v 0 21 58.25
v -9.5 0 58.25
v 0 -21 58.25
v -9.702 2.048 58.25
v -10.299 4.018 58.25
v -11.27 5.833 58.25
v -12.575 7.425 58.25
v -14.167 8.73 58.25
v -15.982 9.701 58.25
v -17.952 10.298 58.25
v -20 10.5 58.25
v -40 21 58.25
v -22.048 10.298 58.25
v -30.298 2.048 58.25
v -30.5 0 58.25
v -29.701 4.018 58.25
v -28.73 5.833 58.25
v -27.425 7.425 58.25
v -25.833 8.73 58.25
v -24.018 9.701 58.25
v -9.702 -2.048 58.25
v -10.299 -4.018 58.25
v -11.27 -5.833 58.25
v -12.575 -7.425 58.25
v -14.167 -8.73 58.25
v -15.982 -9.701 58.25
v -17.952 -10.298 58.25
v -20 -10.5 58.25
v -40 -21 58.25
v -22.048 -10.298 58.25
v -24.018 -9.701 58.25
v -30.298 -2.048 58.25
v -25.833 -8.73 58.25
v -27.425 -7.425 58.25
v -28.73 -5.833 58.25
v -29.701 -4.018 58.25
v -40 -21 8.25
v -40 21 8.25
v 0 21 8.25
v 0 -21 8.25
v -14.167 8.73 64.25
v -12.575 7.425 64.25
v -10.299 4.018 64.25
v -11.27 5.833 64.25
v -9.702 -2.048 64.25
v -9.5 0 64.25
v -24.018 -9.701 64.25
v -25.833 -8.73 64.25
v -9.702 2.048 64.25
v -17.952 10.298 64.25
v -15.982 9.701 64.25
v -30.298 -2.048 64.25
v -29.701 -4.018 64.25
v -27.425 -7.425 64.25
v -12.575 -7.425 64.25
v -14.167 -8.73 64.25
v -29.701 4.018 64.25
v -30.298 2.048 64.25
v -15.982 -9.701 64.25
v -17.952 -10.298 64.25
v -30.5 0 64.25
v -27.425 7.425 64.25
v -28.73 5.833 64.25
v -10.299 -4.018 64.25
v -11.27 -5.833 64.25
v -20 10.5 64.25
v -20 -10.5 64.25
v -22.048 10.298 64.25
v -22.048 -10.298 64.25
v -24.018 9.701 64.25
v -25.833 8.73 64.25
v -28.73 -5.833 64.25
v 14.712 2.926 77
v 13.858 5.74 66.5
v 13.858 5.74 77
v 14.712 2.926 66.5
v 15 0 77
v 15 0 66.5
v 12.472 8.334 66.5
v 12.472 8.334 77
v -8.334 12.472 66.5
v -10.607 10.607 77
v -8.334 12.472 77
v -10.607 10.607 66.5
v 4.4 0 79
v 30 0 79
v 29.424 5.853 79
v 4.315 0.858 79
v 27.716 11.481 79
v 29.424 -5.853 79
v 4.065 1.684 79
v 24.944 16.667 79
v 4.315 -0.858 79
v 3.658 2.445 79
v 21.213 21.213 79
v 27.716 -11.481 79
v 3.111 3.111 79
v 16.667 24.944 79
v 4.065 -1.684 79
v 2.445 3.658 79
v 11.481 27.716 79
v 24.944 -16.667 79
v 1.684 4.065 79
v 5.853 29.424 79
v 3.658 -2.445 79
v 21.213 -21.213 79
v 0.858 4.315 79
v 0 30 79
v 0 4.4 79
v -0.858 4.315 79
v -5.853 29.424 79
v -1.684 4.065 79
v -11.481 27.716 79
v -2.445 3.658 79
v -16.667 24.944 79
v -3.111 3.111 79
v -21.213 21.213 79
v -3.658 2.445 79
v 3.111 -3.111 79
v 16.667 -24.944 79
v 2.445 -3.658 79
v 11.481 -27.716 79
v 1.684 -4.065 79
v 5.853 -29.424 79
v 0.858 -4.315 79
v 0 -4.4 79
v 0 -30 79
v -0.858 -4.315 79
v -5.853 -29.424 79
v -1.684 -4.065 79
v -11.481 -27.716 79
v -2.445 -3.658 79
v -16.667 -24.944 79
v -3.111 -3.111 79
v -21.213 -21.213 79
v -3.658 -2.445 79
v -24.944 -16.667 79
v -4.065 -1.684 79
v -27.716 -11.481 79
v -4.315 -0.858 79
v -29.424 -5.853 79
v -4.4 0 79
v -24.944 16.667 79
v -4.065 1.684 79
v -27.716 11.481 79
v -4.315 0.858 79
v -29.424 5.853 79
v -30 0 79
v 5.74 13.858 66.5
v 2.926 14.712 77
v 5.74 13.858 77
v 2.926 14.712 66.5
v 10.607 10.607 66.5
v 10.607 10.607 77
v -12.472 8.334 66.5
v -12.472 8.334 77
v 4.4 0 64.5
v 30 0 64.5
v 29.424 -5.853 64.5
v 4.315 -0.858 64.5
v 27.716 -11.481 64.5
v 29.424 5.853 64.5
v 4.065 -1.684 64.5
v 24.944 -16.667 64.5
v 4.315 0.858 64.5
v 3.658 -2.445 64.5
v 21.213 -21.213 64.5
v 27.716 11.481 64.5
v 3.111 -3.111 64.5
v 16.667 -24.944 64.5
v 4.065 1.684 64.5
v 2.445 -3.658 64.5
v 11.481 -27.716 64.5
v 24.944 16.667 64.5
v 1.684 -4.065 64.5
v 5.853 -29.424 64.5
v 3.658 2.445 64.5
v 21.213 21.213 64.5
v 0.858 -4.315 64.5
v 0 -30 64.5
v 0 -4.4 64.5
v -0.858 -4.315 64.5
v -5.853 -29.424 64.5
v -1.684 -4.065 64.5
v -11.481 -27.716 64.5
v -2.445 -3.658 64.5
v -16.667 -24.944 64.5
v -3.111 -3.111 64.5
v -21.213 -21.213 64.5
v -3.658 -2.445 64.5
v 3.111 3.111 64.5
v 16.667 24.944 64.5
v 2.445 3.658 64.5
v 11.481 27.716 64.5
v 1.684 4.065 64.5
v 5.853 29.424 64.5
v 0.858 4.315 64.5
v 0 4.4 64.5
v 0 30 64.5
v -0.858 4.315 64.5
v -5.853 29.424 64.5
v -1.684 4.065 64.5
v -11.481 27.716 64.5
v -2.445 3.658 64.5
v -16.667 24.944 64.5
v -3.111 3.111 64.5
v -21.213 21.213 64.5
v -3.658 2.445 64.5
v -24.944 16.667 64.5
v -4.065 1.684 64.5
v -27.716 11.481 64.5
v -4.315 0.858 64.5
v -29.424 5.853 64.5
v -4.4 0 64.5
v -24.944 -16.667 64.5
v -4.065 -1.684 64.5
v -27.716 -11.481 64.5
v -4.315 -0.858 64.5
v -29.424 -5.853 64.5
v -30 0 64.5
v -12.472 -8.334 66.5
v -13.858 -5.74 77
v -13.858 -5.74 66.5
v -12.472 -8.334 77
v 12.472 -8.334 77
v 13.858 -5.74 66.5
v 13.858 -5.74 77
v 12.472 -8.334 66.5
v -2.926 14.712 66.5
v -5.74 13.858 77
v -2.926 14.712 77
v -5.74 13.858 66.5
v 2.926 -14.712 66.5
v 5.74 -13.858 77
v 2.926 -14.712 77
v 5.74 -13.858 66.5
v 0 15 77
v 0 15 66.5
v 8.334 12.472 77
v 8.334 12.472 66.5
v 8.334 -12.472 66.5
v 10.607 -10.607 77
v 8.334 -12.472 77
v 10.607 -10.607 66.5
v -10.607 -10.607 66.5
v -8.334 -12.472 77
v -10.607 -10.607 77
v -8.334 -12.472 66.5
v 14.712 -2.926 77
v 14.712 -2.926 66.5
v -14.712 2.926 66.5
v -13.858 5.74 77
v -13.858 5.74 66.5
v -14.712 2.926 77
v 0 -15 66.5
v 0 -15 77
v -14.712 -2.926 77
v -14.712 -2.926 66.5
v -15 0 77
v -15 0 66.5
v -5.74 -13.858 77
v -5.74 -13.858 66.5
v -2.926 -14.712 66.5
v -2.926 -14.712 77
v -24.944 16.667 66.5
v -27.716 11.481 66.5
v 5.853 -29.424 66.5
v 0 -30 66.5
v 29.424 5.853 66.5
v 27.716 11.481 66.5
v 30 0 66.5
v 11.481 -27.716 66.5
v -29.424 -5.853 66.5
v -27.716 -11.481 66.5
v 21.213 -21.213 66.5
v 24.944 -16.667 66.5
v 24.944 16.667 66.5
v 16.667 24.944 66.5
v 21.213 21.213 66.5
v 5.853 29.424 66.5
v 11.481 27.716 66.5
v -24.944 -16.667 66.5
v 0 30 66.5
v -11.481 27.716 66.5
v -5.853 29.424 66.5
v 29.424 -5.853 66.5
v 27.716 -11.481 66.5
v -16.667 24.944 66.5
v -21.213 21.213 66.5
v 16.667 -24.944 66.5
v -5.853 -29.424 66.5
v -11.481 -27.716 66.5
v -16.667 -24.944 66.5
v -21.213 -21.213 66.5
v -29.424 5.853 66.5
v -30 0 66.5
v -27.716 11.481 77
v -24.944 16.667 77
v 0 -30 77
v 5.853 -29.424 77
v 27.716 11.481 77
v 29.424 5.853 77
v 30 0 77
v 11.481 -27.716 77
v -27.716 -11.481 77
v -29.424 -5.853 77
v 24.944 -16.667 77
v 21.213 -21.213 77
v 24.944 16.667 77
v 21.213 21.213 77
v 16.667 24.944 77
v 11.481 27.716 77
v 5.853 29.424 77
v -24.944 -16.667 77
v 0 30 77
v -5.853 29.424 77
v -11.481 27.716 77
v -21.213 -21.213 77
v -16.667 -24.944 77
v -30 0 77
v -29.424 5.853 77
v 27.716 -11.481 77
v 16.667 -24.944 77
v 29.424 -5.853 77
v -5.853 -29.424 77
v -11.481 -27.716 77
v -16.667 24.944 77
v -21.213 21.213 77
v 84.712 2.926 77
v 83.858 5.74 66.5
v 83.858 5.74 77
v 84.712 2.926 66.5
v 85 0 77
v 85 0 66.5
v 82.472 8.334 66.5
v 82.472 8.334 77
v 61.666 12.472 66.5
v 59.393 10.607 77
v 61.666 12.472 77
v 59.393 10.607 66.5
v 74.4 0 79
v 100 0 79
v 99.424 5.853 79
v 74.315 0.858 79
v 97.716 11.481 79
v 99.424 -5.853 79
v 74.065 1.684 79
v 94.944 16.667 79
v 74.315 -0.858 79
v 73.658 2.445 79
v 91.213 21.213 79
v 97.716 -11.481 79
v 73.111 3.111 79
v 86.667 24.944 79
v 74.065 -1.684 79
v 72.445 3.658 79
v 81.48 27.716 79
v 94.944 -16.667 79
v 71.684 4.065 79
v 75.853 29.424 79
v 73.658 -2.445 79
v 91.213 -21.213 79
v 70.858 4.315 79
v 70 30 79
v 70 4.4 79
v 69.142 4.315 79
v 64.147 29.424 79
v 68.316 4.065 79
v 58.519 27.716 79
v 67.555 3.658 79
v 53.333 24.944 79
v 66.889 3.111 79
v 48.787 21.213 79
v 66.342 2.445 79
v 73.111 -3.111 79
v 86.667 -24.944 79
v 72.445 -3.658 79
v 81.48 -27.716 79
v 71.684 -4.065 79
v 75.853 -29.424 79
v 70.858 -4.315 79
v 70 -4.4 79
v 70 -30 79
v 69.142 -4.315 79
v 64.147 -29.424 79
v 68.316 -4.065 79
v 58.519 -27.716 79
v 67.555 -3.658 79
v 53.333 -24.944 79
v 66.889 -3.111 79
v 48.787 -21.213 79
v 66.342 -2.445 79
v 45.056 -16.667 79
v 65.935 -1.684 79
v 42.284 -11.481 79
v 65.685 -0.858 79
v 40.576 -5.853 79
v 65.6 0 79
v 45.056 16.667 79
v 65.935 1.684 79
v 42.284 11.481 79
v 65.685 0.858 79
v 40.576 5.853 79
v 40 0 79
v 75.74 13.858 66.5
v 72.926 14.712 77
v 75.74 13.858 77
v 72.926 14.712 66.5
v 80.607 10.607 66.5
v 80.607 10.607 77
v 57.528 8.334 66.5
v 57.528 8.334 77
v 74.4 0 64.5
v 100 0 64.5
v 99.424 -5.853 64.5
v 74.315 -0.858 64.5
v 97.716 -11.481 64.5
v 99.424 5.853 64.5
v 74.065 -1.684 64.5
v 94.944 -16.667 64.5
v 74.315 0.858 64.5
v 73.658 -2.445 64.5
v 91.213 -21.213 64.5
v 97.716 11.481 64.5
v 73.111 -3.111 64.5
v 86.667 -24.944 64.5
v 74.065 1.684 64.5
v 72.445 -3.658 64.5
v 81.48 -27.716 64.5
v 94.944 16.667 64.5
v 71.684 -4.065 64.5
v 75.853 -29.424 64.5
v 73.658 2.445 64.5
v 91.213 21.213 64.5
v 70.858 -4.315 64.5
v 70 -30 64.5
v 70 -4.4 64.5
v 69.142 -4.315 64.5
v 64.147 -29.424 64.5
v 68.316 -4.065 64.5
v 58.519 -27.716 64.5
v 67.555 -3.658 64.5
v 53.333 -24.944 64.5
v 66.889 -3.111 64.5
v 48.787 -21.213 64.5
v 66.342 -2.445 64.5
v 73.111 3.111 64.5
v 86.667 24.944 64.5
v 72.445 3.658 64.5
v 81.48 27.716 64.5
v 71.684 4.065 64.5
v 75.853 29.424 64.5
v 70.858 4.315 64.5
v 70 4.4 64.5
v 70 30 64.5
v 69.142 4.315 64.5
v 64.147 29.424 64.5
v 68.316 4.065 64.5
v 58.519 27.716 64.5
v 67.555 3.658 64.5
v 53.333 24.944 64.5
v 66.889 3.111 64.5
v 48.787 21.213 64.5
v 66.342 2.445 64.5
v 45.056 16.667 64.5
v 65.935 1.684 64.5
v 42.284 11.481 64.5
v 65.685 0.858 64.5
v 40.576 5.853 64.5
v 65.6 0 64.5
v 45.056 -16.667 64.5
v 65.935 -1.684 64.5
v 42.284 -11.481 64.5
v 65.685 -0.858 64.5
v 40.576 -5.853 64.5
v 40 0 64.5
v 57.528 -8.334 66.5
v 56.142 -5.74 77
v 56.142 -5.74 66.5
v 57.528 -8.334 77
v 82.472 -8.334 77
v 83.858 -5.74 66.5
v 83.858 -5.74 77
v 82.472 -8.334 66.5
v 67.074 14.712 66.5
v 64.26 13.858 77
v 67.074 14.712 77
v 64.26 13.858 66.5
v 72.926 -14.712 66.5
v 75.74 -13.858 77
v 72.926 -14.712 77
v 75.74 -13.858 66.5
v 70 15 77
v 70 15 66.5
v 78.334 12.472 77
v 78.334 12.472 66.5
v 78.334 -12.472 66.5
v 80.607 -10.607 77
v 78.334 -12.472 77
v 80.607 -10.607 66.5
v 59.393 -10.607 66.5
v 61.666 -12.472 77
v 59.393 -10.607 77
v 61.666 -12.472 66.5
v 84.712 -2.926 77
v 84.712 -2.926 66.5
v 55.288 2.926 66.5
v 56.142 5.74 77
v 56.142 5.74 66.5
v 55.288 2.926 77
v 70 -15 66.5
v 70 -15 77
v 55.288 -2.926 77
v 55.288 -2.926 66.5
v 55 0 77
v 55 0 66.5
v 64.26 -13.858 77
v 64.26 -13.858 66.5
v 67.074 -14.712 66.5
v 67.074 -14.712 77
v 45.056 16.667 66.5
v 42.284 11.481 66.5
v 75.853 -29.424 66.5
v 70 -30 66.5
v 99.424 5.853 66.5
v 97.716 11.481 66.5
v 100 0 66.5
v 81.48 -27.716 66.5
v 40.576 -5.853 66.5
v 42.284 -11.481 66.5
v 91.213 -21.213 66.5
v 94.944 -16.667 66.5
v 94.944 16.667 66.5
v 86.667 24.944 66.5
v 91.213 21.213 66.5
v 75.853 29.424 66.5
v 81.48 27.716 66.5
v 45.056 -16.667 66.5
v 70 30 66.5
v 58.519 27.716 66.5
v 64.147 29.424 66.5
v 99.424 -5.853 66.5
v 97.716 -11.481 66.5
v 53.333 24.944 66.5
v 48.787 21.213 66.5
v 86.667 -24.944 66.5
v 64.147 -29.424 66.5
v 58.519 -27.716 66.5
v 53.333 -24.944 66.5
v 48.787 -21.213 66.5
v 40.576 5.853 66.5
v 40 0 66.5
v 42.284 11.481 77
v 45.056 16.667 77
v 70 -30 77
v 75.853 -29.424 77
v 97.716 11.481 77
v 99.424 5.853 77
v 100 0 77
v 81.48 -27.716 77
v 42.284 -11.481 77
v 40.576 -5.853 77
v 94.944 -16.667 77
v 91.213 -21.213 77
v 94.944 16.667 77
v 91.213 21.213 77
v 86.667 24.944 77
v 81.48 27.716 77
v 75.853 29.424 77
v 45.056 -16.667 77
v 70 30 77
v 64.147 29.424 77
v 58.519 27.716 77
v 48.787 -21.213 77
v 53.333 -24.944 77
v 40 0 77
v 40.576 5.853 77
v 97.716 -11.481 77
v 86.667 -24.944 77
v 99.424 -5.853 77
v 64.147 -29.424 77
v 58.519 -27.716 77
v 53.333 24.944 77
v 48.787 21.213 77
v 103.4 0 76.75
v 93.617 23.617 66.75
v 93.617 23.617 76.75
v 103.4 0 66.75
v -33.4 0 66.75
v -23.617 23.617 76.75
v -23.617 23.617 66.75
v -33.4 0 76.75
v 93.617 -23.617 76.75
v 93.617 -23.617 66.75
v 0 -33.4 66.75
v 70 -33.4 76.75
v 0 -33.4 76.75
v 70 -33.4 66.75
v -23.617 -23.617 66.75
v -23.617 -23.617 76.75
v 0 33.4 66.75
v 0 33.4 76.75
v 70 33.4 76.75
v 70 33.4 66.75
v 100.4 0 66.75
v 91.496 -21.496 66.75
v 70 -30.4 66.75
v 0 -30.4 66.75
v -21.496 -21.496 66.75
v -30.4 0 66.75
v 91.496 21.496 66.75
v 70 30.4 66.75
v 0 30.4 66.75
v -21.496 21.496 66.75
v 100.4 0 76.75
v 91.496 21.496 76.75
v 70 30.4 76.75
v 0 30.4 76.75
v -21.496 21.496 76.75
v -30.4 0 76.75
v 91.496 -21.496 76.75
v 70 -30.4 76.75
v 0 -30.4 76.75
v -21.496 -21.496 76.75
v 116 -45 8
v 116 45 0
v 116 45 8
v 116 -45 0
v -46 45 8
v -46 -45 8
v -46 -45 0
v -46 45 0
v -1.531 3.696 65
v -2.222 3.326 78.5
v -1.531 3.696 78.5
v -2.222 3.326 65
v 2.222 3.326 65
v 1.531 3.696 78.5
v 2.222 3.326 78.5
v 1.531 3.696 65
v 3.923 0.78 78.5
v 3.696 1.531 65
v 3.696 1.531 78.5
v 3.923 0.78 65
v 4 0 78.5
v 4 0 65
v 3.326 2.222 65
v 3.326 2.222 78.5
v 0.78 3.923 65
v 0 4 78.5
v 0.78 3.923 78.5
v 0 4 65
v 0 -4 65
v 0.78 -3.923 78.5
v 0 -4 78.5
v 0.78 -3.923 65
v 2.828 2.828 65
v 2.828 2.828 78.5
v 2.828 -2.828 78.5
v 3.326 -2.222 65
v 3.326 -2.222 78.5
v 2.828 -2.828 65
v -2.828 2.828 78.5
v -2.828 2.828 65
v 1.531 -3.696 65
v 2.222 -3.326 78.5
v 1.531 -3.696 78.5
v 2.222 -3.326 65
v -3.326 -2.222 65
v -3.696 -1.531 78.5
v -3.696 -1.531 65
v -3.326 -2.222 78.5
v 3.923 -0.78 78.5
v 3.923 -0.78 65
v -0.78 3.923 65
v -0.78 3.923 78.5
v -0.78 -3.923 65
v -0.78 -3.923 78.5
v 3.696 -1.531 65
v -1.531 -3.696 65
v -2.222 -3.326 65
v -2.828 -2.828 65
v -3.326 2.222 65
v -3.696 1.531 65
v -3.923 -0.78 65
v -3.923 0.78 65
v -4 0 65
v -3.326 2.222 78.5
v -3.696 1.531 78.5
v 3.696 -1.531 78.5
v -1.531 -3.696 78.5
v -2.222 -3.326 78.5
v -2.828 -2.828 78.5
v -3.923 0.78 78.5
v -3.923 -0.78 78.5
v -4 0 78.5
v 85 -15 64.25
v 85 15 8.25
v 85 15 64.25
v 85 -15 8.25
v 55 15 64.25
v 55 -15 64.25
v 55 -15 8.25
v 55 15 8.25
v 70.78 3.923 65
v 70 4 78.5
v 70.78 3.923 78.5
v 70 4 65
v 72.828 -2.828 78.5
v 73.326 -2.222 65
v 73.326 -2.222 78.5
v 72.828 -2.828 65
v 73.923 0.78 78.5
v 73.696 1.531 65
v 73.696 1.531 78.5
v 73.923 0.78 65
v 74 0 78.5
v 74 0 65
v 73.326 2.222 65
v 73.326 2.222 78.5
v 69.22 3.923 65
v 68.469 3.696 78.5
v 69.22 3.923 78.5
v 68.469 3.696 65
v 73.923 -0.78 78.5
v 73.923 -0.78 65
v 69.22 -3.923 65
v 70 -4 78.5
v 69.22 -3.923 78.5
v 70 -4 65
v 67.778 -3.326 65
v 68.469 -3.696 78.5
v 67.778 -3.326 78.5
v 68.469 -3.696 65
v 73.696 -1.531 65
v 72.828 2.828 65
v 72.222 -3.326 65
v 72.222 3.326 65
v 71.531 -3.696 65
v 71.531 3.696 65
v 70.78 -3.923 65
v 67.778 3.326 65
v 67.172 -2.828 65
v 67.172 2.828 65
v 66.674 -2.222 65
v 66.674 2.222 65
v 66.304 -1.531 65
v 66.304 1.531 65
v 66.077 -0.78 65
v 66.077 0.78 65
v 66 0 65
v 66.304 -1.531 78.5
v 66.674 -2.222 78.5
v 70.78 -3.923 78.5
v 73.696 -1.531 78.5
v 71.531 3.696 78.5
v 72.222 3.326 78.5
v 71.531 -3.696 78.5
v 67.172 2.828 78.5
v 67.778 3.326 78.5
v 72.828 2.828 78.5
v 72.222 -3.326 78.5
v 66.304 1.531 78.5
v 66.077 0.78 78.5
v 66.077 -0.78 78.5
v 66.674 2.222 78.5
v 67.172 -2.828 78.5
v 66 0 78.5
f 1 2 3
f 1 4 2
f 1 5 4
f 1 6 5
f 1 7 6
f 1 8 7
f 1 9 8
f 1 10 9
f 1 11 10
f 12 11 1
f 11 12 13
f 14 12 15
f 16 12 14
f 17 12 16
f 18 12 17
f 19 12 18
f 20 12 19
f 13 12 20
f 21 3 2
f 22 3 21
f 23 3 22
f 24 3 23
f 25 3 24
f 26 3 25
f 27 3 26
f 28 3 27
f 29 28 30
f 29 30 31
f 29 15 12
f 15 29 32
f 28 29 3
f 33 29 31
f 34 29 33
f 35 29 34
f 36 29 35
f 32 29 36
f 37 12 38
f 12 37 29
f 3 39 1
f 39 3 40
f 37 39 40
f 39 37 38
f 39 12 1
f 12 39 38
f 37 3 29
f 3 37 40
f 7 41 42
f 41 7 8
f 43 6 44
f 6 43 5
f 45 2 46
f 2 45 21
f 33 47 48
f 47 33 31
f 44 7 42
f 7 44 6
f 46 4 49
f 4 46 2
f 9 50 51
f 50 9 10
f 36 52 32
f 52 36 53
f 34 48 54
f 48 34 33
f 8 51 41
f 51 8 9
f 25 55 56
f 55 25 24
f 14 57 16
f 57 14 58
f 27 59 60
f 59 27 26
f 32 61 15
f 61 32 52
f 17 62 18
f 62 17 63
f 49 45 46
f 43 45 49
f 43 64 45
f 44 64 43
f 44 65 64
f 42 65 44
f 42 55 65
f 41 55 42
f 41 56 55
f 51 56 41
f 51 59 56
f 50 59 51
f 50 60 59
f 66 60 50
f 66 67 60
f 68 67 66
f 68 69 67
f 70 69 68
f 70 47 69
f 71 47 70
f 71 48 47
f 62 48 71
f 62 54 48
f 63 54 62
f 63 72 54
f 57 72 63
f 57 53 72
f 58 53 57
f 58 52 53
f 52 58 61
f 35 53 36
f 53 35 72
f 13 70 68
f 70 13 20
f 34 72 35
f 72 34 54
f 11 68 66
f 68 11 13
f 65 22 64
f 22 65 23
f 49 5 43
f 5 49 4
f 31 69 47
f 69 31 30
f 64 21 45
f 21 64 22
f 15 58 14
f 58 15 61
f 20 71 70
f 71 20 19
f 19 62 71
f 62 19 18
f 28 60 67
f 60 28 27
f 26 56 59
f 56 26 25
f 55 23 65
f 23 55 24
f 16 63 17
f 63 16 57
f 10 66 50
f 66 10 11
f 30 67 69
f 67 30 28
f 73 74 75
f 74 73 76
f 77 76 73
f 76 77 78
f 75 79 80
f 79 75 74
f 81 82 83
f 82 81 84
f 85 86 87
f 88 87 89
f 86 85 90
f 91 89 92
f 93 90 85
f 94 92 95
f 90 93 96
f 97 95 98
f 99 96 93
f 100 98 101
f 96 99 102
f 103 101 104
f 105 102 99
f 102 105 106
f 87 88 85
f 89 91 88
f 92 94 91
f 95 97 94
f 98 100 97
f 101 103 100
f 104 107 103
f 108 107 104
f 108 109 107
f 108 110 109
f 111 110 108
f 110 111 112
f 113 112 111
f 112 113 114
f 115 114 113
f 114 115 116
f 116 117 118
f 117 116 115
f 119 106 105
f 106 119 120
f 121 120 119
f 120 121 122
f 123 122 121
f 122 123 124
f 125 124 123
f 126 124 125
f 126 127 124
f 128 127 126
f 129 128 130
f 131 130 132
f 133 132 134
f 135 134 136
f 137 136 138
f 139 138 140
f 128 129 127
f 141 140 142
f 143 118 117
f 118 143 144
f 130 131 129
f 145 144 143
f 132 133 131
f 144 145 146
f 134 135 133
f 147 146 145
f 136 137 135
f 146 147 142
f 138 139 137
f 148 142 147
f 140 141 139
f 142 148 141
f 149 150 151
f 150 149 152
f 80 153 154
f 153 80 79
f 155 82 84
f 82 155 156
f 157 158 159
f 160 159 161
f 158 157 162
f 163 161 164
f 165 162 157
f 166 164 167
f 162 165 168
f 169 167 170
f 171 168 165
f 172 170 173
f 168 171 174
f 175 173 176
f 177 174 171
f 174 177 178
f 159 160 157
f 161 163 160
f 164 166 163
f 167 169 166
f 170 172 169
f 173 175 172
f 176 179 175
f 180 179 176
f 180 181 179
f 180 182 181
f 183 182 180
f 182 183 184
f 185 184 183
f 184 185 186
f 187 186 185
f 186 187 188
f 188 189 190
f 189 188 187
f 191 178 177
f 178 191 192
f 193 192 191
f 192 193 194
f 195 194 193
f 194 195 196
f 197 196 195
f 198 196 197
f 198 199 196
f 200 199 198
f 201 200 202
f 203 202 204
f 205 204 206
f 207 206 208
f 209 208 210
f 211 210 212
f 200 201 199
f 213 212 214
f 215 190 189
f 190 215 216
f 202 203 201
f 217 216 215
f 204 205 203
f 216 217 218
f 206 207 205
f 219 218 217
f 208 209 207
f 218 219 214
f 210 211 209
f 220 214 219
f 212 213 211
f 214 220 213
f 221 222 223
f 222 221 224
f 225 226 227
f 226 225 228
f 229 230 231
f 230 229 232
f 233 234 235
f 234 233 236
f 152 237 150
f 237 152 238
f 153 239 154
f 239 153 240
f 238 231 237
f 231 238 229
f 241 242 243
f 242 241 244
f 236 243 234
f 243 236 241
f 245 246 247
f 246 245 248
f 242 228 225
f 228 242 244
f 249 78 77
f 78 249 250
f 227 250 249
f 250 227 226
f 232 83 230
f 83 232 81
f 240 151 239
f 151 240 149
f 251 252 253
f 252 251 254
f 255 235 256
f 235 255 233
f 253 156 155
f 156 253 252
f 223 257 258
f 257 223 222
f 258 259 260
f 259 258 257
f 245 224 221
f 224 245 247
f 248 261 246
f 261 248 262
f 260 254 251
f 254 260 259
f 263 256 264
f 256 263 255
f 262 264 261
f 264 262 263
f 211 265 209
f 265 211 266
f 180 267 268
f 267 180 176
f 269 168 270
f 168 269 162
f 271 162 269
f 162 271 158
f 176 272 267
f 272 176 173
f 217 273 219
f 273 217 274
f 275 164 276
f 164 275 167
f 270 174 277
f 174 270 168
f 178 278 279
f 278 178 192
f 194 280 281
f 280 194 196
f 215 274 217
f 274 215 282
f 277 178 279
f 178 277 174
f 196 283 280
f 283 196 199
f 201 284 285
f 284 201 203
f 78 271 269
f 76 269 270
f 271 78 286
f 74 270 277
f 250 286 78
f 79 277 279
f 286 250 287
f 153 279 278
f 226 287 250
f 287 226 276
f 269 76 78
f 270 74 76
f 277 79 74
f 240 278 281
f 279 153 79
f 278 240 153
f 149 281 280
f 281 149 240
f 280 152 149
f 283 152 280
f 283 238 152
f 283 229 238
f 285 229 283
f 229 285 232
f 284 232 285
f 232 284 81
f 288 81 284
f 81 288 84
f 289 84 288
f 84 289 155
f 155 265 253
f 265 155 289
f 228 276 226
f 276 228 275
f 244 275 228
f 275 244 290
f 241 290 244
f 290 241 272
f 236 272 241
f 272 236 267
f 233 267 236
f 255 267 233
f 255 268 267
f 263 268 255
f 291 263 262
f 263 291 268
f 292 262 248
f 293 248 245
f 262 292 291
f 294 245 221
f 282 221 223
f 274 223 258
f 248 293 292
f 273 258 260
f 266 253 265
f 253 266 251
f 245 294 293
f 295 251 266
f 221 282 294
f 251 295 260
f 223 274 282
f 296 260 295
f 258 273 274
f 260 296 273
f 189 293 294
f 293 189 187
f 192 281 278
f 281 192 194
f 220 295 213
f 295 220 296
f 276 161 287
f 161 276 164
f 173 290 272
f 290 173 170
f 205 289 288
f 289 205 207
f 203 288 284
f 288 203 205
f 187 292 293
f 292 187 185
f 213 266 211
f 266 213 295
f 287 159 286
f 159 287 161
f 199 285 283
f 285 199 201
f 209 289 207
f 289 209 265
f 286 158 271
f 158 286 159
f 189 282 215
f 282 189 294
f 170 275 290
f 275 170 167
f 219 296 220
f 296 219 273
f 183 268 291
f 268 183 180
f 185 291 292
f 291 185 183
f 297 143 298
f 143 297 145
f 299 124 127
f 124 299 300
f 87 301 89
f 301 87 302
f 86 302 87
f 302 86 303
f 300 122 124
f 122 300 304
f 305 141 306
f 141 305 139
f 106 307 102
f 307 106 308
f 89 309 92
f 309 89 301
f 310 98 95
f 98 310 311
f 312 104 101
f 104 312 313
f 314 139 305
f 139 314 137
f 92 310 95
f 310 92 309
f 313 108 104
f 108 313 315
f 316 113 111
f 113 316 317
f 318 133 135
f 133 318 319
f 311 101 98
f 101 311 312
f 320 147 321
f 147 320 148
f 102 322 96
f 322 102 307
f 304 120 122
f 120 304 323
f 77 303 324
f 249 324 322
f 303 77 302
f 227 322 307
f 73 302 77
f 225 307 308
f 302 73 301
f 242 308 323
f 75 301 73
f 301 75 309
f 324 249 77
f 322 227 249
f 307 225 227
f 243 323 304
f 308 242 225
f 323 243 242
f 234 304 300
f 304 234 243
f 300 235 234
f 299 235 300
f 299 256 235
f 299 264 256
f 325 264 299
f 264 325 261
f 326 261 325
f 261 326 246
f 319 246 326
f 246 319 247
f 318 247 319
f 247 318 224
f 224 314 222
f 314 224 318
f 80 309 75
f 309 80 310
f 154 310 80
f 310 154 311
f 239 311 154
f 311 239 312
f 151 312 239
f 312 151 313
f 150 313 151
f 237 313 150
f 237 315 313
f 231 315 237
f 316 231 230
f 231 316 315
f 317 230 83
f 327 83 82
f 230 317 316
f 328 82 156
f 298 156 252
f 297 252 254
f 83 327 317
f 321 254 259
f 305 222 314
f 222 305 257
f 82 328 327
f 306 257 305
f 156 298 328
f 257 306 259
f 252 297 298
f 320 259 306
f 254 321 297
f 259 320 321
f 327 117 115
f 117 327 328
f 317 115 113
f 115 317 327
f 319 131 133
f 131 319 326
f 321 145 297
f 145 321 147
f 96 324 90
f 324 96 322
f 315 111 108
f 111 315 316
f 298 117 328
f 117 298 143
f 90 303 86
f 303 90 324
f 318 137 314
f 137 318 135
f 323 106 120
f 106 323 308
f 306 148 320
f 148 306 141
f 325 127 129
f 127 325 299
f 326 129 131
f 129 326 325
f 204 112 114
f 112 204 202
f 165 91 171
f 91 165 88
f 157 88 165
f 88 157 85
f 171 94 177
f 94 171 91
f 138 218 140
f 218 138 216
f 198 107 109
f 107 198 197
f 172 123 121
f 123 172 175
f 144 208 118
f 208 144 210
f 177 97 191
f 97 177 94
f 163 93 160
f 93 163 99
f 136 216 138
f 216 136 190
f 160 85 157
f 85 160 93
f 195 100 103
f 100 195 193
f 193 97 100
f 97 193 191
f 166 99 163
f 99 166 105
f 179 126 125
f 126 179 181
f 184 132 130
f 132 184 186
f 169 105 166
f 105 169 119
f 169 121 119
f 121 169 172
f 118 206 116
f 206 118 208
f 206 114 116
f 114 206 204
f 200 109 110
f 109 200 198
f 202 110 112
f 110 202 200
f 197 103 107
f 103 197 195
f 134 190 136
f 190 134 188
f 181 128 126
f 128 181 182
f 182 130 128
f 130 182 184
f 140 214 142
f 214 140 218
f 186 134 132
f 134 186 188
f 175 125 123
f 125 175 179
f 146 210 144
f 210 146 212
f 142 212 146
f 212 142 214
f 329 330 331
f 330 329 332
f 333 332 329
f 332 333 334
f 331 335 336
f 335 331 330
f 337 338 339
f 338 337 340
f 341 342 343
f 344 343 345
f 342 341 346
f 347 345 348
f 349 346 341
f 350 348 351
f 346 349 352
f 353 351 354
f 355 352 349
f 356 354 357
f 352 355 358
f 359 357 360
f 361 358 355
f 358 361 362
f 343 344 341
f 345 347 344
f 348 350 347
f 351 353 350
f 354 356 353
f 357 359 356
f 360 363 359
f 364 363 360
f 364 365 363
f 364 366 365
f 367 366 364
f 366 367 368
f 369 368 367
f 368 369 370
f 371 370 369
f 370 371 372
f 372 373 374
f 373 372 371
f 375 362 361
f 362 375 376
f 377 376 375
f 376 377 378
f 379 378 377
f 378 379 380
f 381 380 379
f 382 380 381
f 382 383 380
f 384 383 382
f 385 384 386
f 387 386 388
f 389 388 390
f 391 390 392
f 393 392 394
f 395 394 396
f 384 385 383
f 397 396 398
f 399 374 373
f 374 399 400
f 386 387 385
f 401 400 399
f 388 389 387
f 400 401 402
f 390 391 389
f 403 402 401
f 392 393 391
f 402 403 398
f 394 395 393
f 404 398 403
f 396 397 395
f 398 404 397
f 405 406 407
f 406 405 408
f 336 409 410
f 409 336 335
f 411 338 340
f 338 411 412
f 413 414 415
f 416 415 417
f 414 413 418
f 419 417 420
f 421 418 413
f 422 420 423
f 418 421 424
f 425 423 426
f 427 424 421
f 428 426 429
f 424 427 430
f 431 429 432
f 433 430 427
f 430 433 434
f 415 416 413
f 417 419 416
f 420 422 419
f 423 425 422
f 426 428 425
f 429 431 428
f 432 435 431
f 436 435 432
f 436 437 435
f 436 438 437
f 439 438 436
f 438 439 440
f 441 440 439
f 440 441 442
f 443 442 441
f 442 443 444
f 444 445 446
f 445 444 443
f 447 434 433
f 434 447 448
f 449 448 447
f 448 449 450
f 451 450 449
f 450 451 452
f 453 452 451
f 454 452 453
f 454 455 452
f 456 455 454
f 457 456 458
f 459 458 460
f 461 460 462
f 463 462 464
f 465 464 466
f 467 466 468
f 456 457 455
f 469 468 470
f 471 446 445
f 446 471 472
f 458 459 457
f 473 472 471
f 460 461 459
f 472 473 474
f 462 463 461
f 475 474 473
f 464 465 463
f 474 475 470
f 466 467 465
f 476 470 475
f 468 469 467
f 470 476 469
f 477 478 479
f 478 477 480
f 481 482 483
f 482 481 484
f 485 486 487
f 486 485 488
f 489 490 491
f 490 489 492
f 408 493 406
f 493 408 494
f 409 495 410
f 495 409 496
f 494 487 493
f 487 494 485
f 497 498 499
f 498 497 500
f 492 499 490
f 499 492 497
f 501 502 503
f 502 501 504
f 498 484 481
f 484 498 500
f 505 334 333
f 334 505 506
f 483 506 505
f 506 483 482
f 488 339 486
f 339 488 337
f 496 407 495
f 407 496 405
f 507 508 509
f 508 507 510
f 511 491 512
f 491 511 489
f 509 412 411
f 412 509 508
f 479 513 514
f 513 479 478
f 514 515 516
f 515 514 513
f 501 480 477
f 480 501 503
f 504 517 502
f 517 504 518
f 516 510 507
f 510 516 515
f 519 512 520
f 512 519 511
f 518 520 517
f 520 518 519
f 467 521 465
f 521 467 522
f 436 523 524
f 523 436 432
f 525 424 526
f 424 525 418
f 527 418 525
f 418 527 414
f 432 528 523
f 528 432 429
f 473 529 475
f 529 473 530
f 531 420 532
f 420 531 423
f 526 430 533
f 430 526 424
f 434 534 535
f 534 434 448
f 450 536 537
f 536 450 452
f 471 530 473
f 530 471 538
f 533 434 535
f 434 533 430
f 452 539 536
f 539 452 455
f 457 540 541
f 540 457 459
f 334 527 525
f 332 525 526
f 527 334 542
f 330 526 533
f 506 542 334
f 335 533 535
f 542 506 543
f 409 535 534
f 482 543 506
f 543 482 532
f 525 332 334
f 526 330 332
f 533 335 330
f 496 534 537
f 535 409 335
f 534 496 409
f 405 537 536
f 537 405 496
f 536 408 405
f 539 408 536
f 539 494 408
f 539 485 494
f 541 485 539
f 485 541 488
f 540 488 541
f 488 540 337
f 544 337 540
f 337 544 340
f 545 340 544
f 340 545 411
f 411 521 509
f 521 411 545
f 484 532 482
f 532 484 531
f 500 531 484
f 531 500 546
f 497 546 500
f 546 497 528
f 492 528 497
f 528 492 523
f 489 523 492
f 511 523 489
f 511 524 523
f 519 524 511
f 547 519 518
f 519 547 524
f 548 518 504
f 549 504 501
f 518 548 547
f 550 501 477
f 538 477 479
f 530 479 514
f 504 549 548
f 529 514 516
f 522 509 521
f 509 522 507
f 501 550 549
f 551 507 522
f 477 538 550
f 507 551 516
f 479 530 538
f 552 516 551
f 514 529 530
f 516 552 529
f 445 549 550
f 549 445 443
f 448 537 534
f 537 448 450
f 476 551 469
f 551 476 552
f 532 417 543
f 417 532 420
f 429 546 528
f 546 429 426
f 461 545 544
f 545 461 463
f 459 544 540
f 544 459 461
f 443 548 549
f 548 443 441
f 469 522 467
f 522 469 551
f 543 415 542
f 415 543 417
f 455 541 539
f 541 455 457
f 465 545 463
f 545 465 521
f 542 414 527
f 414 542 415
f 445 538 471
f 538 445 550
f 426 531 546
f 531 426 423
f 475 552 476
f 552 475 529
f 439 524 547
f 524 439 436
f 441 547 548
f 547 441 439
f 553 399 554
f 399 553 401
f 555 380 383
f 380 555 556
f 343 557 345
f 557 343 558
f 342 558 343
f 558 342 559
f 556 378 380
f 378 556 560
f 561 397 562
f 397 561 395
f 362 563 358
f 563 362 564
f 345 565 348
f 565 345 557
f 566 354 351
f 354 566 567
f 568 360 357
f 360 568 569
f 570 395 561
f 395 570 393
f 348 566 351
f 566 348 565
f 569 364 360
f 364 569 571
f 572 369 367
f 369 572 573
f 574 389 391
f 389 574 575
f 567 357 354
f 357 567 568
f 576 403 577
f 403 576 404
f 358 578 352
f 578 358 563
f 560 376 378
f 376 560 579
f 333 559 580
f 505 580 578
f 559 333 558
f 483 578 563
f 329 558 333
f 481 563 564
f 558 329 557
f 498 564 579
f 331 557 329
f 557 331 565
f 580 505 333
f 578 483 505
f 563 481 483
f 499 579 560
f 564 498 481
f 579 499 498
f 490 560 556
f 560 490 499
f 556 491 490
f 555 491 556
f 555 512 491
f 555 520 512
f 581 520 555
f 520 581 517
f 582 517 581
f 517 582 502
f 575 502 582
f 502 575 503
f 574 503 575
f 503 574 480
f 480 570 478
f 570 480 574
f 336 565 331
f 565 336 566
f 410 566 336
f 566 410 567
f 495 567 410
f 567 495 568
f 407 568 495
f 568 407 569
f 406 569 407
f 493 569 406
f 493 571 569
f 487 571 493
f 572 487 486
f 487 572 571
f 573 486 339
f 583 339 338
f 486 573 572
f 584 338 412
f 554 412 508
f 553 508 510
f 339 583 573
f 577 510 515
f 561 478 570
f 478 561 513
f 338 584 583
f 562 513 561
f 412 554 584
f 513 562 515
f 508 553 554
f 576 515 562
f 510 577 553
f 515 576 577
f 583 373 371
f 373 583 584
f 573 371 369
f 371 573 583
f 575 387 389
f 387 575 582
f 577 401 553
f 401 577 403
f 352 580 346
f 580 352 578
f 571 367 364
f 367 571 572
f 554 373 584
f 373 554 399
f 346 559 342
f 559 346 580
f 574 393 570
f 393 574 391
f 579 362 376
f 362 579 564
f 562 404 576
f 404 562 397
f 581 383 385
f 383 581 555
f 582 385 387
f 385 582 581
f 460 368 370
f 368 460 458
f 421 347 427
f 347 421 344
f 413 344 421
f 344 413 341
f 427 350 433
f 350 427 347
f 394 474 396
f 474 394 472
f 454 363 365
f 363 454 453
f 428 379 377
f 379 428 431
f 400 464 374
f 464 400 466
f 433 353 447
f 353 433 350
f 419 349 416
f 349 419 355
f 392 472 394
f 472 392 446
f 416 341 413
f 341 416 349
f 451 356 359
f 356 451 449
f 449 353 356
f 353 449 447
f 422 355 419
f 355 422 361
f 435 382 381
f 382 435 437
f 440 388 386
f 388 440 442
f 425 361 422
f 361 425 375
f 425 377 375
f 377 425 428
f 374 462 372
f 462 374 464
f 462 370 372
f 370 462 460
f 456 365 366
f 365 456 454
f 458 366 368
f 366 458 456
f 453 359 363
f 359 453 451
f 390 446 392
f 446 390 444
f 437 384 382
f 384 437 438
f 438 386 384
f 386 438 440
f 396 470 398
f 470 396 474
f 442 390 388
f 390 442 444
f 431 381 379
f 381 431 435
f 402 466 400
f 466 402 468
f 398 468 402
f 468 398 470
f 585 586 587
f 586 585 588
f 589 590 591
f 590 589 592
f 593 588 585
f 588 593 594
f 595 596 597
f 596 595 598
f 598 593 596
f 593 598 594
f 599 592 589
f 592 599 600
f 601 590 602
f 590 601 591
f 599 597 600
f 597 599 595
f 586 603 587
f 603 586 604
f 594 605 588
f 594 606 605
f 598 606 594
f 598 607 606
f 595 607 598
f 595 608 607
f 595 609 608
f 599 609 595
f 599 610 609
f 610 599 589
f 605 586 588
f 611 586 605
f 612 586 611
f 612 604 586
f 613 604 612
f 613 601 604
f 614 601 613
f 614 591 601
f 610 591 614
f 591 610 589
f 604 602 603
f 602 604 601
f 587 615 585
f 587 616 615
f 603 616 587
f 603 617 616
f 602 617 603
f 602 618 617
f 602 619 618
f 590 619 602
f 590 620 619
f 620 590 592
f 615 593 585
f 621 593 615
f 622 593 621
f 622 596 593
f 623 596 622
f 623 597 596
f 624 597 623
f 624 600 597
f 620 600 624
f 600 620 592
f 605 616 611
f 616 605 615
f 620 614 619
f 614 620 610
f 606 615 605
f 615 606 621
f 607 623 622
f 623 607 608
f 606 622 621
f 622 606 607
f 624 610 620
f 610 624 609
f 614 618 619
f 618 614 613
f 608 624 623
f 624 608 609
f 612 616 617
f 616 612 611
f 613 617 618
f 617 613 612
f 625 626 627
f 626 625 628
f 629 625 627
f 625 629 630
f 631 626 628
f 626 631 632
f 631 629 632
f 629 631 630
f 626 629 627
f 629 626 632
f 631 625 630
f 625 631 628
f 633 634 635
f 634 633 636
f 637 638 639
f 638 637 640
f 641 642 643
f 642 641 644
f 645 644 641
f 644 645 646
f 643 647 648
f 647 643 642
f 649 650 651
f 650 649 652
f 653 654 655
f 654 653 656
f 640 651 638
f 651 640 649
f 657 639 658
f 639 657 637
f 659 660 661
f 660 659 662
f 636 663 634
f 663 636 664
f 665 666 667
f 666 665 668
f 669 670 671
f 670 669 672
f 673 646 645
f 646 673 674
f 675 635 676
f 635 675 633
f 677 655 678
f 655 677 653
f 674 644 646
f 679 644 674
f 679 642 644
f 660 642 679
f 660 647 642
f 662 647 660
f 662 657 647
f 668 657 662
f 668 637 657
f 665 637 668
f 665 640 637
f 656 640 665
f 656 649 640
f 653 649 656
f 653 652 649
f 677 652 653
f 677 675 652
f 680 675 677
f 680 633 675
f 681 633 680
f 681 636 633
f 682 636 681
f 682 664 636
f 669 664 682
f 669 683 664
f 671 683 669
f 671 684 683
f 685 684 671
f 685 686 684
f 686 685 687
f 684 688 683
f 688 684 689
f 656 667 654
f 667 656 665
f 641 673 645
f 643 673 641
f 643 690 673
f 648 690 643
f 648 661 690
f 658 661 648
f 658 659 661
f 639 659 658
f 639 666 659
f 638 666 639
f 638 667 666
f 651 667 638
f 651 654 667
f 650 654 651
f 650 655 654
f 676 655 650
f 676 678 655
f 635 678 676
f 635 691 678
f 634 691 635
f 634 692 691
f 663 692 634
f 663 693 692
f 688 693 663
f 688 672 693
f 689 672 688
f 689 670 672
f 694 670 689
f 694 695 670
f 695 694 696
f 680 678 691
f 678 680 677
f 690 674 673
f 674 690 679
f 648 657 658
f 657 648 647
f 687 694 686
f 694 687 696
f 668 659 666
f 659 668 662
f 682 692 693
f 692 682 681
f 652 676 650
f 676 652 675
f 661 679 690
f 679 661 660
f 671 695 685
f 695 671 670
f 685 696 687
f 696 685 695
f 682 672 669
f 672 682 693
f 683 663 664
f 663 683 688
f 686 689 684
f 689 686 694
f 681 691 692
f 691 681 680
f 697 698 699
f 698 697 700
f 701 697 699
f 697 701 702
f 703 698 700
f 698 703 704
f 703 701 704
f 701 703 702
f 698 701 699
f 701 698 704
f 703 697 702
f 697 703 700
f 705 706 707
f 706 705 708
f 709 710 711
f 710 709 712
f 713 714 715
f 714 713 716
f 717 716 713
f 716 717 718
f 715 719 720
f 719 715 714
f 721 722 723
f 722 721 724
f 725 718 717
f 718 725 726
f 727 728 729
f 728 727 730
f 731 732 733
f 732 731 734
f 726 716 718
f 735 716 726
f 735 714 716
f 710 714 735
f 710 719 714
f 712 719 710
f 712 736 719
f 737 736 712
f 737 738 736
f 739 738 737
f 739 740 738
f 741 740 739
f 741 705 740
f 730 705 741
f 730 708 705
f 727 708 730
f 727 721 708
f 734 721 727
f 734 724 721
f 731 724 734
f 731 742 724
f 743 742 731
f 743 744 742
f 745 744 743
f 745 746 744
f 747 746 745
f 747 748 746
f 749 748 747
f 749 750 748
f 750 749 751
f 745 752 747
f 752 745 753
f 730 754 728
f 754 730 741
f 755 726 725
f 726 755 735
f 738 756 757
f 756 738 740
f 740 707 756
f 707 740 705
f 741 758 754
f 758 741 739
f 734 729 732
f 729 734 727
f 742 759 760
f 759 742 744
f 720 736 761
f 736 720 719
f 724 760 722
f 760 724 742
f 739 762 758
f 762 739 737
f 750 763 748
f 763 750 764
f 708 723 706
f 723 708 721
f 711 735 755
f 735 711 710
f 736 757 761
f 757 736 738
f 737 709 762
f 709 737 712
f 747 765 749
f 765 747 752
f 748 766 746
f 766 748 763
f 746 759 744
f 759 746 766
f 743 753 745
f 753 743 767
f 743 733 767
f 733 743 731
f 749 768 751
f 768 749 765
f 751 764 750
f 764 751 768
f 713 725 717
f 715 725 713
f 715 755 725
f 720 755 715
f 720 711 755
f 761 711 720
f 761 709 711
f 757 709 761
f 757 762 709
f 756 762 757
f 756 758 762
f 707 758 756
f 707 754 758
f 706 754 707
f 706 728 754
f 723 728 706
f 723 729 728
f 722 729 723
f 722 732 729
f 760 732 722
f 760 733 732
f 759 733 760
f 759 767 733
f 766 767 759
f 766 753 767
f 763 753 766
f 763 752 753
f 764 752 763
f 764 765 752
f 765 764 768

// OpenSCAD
$fn = 32;

// ------------------------------------------------------------------------
// Motor belt drive: span 70 mm, pulleys d60, belt 10 mm wide
// Every part is its own module, assembly() places every instance.
// ------------------------------------------------------------------------

// --- part 1 ---
module base_plate() {
  difference() {
    translate([-81, -45, 0]) cube([162, 90, 8]);
  }
}

// --- part 2 ---
module motor() {
  union() {
    translate([-25, -21, 0]) cube([50, 42, 40]);
    translate([28, 0, 20]) rotate([0, 90, 0]) cylinder(h = 6, d = 21, center = true);
  }
}

// --- part 3 ---
module drive_shaft() {
  translate([0, 0, -6.75]) cylinder(h = 13.5, d = 8);
}

// --- part 4 ---
module pulley_drive() {
  difference() {
    union() {
      cylinder(h = 14.5, d = 30);
      cylinder(h = 2, d = 60);
      translate([0, 0, 12.5]) cylinder(h = 2, d = 60);
    }
    translate([0, 0, -1]) cylinder(h = 16.5, d = 8.8);
  }
}

// --- part 5 ---
module idler_post() {
  translate([-15, -15, 0]) cube([30, 30, 56]);
}

// --- part 6 ---
module driven_shaft() {
  translate([0, 0, -6.75]) cylinder(h = 13.5, d = 8);
}

// --- part 7 ---
module pulley_driven() {
  difference() {
    union() {
      cylinder(h = 14.5, d = 30);
      cylinder(h = 2, d = 60);
      translate([0, 0, 12.5]) cylinder(h = 2, d = 60);
    }
    translate([0, 0, -1]) cylinder(h = 16.5, d = 8.8);
  }
}

// --- part 8 ---
module drive_belt() {
  difference() {
    linear_extrude(height = 10) polygon(points = concat([for (a = [90 : 45 : 270]) [33.4 * cos(a), 33.4 * sin(a)]], [for (a = [270 : 45 : 450]) [70 + 33.4 * cos(a), 33.4 * sin(a)]]));
    translate([0, 0, -1]) linear_extrude(height = 12) polygon(points = concat([for (a = [90 : 45 : 270]) [30.4 * cos(a), 30.4 * sin(a)]], [for (a = [270 : 45 : 450]) [70 + 30.4 * cos(a), 30.4 * sin(a)]]));
  }
}

// --- assembly ---
module assembly() {
  color([0.80, 0.24, 0.20]) translate([35, 0, 0]) rotate([0, 0, 0]) base_plate();
  color([0.20, 0.45, 0.75]) translate([0, 0, 33.25]) rotate([0, 270, 0]) motor();
  color([0.25, 0.62, 0.32]) translate([0, 0, 71.75]) rotate([0, 0, 0]) drive_shaft();
  color([0.92, 0.70, 0.18]) translate([0, 0, 64.5]) rotate([0, 0, 0]) pulley_drive();
  color([0.58, 0.35, 0.70]) translate([70, 0, 8.25]) rotate([0, 0, 0]) idler_post();
  color([0.16, 0.66, 0.66]) translate([70, 0, 71.75]) rotate([0, 0, 0]) driven_shaft();
  color([0.85, 0.48, 0.18]) translate([70, 0, 64.5]) rotate([0, 0, 0]) pulley_driven();
  color([0.55, 0.60, 0.65]) translate([0, 0, 66.75]) rotate([0, 0, 0]) drive_belt();
}

assembly();
